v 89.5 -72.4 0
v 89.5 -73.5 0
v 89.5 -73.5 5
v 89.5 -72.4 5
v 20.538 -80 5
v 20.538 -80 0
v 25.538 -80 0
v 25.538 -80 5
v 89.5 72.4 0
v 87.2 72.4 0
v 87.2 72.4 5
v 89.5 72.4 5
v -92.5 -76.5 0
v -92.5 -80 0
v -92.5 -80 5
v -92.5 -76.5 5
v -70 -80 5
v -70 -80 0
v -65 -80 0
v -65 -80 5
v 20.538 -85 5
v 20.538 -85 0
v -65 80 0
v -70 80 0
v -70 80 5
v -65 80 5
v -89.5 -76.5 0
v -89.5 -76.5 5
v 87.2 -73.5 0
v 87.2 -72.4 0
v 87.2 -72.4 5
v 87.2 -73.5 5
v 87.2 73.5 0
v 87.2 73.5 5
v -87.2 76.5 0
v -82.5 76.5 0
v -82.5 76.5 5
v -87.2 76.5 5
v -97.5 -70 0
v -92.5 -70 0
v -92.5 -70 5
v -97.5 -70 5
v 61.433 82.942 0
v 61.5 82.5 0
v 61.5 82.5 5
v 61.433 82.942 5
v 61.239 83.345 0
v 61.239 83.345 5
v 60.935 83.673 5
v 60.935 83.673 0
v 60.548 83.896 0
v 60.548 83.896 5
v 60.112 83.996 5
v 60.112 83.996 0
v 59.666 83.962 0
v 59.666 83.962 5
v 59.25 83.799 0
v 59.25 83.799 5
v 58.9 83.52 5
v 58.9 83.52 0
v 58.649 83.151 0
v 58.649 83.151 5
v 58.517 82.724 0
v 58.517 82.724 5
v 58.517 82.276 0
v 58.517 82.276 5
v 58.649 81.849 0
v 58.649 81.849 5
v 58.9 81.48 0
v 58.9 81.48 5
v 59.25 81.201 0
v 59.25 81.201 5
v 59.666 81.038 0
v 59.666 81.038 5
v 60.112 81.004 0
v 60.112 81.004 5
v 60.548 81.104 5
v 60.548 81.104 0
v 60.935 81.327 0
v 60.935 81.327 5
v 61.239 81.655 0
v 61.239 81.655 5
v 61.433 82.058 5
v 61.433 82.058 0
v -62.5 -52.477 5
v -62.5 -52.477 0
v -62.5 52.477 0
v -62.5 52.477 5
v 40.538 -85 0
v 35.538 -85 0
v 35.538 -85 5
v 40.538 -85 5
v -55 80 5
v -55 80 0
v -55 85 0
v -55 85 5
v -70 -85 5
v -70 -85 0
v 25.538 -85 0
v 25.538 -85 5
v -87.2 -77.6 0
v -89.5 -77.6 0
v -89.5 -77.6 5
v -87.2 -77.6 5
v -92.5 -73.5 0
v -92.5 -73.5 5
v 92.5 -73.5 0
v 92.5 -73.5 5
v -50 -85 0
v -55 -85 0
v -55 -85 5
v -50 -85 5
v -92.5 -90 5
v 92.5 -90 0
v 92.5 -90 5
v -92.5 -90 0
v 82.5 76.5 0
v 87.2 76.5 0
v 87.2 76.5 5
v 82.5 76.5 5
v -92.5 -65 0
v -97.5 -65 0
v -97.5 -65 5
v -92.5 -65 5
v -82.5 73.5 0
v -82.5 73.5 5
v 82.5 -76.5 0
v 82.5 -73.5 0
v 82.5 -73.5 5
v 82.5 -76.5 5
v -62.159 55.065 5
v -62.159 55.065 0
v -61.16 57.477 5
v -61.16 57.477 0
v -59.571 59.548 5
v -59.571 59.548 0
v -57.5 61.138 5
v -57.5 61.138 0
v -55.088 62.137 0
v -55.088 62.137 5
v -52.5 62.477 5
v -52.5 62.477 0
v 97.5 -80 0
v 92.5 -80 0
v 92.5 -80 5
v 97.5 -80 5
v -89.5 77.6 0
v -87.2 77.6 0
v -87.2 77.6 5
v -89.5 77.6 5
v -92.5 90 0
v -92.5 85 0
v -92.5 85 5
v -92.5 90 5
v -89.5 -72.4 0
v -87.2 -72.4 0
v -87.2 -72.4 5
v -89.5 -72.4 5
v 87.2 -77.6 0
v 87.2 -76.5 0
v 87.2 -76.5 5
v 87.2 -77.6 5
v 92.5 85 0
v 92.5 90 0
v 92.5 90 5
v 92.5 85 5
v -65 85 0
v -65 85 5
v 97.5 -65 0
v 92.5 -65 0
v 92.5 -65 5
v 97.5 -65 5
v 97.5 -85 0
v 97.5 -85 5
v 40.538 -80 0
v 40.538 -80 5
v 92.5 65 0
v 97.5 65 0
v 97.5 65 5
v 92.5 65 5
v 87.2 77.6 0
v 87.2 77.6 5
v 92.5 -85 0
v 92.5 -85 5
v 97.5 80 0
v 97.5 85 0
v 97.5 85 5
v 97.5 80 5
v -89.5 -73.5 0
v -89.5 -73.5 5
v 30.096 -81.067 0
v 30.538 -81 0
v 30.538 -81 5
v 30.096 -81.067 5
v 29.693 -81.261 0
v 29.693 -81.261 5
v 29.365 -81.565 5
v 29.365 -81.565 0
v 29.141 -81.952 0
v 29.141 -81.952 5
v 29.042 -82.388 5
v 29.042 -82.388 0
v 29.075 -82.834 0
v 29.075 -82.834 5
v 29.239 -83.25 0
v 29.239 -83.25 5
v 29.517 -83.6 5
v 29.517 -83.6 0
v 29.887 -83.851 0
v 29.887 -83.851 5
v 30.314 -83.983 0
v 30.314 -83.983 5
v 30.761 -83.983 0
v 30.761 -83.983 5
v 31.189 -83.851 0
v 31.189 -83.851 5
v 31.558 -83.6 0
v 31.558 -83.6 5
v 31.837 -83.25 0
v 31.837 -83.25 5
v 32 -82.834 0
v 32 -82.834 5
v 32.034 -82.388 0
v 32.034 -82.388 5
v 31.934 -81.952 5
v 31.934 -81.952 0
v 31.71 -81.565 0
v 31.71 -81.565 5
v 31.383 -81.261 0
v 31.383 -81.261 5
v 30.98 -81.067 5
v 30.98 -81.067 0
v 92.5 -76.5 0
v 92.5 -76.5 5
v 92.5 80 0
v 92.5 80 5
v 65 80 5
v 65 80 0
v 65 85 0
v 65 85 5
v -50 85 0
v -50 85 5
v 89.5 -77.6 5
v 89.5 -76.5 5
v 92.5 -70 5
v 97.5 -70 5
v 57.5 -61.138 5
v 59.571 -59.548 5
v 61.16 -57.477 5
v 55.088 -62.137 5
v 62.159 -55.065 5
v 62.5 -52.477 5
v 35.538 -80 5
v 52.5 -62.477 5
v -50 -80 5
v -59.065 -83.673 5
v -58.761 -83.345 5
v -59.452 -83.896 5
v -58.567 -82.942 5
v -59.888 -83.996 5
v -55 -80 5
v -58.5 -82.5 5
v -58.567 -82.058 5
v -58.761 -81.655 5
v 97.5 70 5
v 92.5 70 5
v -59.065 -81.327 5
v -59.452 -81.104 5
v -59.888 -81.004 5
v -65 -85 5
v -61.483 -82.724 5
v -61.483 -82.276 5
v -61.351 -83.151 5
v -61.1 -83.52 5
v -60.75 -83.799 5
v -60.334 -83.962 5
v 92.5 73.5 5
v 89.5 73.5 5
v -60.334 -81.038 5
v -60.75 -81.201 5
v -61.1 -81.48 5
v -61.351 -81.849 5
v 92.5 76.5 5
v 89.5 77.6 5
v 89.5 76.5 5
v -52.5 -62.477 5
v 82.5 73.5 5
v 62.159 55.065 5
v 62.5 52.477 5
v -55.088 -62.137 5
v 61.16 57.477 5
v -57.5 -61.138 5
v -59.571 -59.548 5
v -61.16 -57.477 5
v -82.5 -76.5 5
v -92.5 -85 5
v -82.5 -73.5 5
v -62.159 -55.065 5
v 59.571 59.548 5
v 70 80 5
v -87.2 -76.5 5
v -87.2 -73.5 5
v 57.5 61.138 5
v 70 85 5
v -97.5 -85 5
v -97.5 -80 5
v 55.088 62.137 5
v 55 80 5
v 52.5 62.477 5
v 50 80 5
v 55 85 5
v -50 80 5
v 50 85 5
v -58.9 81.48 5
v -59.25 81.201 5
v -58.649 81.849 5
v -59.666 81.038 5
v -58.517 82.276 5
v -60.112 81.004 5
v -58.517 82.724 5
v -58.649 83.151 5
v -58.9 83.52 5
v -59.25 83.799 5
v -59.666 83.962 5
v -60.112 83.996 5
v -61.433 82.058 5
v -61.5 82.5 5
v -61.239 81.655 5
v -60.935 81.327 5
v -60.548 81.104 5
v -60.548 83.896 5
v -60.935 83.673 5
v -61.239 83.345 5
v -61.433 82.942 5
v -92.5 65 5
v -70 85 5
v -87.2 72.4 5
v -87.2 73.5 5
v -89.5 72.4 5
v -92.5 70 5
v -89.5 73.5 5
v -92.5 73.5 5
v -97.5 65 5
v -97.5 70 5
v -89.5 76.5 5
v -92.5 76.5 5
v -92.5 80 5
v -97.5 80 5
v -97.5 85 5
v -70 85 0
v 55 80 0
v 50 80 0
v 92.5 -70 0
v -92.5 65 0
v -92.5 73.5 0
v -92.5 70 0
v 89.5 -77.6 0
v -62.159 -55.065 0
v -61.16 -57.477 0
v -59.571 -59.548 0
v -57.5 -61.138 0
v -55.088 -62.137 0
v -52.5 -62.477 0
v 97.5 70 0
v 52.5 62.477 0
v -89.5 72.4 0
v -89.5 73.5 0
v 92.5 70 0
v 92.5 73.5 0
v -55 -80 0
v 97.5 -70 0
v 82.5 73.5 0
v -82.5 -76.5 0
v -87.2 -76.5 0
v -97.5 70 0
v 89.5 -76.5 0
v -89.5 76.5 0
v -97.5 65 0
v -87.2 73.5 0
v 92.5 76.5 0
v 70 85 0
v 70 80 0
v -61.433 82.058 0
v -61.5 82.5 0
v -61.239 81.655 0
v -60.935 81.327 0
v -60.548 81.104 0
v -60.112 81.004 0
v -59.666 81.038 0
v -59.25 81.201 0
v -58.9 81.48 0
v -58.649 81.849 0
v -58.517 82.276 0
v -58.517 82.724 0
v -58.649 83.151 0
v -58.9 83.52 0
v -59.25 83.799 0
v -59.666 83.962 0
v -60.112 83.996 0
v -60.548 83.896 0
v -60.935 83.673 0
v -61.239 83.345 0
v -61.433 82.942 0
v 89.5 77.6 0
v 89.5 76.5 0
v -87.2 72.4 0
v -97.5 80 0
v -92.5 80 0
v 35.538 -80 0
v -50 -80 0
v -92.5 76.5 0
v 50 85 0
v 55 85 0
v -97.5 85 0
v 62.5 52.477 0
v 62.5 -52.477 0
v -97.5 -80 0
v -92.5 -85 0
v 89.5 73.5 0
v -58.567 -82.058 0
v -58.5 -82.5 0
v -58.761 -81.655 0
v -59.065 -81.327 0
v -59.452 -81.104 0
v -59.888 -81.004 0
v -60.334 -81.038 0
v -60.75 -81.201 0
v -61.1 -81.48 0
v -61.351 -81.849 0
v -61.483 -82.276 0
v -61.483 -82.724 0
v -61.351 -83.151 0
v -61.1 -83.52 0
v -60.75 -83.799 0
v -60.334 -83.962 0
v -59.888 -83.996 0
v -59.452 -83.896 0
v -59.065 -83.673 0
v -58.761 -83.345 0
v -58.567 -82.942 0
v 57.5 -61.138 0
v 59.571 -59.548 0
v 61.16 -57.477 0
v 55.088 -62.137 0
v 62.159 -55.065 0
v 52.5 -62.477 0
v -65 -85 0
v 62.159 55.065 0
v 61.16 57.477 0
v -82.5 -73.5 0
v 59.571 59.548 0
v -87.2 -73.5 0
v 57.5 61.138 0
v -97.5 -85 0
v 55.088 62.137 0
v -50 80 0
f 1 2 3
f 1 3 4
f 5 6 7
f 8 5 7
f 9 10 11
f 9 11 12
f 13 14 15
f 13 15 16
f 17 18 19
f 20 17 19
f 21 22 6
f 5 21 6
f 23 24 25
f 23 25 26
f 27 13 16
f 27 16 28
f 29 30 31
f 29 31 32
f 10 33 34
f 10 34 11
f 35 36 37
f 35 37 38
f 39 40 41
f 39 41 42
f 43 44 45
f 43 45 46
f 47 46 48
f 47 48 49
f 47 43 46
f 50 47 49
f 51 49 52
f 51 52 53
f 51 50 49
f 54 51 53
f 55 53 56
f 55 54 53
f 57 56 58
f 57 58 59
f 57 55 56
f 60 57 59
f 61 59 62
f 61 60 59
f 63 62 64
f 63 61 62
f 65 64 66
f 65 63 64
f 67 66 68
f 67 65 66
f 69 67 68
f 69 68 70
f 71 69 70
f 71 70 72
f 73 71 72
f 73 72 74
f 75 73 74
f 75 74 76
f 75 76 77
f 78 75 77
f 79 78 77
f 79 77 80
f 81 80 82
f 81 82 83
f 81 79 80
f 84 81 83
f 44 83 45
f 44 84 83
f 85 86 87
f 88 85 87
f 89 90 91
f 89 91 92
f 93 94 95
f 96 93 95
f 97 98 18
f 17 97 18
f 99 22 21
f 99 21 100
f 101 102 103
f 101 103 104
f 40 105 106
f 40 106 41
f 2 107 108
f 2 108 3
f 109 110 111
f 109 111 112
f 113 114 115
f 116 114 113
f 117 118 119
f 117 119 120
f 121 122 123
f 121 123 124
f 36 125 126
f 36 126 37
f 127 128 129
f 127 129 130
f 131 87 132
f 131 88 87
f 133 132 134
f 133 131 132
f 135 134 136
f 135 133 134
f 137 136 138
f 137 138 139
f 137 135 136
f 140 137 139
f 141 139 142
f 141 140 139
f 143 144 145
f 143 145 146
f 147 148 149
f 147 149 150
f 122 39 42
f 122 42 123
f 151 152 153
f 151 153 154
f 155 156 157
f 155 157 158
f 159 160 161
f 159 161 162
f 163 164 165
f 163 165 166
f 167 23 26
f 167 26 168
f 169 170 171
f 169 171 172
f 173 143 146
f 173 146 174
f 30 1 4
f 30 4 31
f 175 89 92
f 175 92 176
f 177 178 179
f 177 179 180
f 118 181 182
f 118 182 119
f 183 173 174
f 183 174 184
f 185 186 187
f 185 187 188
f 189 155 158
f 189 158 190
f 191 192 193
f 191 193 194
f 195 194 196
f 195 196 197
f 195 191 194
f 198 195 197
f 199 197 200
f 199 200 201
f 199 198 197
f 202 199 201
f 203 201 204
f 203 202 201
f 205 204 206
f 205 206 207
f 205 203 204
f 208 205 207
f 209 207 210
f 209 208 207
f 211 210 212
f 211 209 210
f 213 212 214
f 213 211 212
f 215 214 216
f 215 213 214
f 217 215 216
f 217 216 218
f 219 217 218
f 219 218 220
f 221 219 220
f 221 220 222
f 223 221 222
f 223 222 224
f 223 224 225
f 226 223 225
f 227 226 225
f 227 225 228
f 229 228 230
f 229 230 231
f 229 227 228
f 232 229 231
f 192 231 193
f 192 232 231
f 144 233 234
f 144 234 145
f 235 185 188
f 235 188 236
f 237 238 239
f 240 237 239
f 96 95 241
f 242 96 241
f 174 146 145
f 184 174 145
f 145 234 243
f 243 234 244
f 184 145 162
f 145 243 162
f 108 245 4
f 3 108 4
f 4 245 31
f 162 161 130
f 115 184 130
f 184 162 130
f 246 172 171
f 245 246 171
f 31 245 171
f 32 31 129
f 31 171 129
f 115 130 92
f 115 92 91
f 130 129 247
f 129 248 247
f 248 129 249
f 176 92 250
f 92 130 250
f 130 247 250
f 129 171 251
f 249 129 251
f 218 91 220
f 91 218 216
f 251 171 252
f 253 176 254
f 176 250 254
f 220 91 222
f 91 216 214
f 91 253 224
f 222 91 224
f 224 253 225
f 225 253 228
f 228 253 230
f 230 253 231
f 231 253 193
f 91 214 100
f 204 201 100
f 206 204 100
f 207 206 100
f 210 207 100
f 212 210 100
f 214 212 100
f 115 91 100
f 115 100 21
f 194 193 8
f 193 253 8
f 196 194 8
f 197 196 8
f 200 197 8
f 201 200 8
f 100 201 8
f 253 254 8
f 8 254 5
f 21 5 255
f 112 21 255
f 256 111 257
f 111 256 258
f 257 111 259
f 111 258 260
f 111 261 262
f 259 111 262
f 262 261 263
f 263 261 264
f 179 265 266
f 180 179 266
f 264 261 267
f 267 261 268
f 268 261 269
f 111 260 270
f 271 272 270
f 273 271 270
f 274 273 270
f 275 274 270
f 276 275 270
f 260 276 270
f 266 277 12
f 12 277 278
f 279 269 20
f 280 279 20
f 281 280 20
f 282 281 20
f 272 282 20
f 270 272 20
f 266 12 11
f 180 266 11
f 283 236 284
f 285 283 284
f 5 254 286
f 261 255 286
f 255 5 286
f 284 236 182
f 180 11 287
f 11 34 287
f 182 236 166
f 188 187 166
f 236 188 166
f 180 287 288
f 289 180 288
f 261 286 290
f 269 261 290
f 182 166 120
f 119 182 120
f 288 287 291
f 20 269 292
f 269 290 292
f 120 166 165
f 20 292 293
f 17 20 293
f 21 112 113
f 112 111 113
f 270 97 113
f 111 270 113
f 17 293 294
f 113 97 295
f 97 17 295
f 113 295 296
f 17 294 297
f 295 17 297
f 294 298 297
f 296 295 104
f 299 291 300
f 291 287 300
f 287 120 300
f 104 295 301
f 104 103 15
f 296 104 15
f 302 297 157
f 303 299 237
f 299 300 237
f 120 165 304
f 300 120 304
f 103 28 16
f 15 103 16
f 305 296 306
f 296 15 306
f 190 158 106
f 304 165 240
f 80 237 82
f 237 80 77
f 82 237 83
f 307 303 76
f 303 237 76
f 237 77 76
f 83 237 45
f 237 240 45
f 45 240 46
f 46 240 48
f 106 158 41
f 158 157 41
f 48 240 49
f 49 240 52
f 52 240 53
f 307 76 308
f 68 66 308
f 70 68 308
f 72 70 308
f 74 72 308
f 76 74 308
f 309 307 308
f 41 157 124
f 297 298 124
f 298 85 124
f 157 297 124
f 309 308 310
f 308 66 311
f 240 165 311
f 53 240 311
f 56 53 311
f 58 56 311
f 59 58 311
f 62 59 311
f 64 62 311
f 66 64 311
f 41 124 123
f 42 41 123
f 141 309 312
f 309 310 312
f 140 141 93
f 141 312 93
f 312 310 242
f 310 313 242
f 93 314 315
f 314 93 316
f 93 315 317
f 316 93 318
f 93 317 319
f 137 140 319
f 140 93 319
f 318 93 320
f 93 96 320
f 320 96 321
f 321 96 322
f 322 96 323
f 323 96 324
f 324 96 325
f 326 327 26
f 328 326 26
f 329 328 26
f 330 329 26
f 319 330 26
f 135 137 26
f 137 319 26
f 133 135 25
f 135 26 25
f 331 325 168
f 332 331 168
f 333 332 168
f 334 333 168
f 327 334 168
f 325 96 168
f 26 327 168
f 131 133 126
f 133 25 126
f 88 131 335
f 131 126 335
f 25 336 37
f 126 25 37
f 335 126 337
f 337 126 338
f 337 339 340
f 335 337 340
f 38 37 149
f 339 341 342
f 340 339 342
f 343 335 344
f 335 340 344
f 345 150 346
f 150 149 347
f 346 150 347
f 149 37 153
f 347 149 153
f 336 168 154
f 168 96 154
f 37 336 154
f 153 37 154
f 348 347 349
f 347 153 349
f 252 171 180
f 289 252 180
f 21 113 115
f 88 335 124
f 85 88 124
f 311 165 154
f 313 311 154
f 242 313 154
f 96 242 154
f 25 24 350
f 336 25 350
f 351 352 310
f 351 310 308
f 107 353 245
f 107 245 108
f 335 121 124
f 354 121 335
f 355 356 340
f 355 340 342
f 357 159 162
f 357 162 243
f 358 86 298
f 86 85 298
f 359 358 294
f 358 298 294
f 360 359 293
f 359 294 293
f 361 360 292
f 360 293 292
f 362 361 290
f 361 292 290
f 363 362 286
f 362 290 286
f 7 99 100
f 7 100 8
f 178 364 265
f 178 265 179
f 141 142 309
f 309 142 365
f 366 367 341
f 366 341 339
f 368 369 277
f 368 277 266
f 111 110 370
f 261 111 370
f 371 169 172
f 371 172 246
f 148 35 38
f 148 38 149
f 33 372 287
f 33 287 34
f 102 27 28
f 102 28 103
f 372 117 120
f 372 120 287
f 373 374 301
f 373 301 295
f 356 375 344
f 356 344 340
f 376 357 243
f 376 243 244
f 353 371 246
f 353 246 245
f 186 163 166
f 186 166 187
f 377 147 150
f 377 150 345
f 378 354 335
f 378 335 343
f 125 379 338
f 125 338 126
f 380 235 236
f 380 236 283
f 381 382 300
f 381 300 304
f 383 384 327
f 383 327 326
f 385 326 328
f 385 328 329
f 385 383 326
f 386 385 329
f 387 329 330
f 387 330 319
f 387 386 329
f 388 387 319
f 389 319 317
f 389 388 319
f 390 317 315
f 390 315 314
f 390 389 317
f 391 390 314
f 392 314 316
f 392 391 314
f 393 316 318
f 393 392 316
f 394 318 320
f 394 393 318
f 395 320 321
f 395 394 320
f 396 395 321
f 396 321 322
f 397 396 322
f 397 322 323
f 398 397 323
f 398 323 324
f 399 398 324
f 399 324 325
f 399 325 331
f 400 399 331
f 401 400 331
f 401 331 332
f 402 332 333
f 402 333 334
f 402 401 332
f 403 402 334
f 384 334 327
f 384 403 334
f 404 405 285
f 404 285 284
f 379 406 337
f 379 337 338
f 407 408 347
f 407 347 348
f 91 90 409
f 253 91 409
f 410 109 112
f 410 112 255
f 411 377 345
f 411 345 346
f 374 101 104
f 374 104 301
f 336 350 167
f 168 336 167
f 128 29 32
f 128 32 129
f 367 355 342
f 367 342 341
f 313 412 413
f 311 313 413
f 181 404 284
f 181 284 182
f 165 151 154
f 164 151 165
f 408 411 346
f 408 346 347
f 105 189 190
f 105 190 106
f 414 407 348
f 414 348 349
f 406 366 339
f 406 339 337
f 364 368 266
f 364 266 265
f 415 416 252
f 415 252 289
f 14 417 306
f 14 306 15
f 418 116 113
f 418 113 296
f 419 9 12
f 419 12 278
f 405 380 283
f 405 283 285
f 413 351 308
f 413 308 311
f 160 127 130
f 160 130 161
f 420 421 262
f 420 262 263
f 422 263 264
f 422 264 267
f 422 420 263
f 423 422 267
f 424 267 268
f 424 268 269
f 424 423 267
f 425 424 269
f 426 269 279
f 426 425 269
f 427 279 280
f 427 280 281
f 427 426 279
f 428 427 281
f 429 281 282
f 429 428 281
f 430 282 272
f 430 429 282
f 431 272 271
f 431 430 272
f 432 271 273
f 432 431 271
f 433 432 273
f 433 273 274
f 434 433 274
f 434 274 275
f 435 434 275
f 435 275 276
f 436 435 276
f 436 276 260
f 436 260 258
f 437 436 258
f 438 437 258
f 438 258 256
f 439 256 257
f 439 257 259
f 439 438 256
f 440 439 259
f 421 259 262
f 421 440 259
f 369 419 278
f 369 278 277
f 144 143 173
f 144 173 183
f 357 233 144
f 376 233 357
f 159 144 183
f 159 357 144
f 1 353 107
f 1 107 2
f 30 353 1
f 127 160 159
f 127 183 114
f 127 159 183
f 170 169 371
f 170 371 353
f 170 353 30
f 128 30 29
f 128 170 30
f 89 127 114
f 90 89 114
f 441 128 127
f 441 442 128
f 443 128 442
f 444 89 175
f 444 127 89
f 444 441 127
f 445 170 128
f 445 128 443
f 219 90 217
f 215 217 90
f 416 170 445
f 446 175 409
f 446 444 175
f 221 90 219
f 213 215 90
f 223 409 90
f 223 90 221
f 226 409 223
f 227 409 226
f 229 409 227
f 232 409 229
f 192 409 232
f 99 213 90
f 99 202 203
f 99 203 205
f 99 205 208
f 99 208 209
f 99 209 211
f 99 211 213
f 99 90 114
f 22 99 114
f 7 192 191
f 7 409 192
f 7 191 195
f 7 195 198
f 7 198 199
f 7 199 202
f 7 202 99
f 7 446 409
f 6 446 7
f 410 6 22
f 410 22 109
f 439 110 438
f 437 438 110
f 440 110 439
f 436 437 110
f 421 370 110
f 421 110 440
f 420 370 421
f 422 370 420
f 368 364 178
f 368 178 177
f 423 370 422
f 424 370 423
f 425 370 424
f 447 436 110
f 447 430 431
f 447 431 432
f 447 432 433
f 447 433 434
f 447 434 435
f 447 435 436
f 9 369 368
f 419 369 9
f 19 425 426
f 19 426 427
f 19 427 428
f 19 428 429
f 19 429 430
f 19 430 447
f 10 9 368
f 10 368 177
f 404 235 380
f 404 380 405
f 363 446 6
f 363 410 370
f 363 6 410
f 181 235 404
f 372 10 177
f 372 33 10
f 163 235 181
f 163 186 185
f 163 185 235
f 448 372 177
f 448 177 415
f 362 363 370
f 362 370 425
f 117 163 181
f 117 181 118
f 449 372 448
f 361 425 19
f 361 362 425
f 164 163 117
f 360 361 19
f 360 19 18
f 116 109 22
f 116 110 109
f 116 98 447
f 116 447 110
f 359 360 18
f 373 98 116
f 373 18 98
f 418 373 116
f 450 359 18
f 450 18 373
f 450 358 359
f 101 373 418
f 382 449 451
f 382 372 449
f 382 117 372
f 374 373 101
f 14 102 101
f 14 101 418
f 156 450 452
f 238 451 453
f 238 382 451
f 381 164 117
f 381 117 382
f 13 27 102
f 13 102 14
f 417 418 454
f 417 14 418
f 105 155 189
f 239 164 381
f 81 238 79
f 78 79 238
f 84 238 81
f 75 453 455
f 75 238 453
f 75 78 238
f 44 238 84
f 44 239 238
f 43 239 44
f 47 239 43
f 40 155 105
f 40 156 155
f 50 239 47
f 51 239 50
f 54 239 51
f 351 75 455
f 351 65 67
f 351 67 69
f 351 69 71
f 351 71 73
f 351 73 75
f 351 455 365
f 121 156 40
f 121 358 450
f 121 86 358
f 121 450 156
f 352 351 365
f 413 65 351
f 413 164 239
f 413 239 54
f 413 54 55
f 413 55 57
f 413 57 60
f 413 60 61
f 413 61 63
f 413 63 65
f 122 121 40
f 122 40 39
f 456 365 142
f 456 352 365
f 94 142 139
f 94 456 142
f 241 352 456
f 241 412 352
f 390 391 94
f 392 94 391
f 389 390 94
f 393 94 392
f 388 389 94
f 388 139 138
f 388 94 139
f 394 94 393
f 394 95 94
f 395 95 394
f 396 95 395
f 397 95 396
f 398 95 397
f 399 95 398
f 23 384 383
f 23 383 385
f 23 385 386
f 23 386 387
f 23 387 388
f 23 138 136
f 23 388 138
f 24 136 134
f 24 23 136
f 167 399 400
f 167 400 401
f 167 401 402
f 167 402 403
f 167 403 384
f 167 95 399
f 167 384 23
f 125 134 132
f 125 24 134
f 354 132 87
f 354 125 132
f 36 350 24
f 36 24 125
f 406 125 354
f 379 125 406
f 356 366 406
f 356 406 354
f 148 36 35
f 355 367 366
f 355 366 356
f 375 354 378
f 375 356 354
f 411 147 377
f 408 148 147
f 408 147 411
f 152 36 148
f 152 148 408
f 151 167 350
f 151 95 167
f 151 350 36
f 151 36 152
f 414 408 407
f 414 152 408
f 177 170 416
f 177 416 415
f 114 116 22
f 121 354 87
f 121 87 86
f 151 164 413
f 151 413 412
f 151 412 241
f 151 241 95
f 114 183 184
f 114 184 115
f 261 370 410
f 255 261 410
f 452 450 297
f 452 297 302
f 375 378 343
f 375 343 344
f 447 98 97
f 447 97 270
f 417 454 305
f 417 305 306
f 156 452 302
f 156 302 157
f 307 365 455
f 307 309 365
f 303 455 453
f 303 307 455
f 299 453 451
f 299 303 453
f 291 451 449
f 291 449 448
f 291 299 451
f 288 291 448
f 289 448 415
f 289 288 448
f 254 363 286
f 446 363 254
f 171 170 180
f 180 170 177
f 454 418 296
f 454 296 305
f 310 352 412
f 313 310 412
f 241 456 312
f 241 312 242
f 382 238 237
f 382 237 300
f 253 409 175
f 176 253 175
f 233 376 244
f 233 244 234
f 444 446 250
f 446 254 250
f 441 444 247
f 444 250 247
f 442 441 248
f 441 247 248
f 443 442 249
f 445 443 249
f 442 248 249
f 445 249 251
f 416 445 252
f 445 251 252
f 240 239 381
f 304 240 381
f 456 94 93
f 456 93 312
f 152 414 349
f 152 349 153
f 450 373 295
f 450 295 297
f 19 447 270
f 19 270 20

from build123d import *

# Parameters (mm, degrees)
SKETCH1_R           = 1.5
SKETCH1_W           = 125
SKETCH1_H           = 124.954514062
SKETCH1_W_2         = 5
SKETCH1_H_2         = 5
BOSS_EXTRUDE1_DEPTH = 5
FILLET1_R           = 10


with BuildPart() as part:
    # Sketch1 → Boss-Extrude1 (new body)
    with BuildSketch(Plane.XY):
        Polygon((92.5, 62.5), (92.5, -62.5), (92.5, -65), (97.5, -65), (97.5, -70), (92.5, -70), (92.5, -73.5), (89.5, -73.5), (89.5, -72.4), (87.2, -72.4), (87.2, -73.5), (82.5, -73.5), (82.5, -76.5), (87.2, -76.5), (87.2, -77.6), (89.5, -77.6), (89.5, -76.5), (92.5, -76.5), (92.5, -80), (97.5, -80), (97.5, -85), (92.5, -85), (92.5, -90), (-92.5, -90), (-92.5, -85), (-97.5, -85), (-97.5, -80), (-92.5, -80), (-92.5, -76.5), (-89.5, -76.5), (-89.5, -77.6), (-87.2, -77.6), (-87.2, -76.5), (-82.5, -76.5), (-82.5, -73.5), (-87.2, -73.5), (-87.2, -72.4), (-89.5, -72.4), (-89.5, -73.5), (-92.5, -73.5), (-92.5, -70), (-97.5, -70), (-97.5, -65), (-92.5, -65), (-92.5, 65), (-97.5, 65), (-97.5, 70), (-92.5, 70), (-92.5, 73.5), (-89.5, 73.5), (-89.5, 72.4), (-87.2, 72.4), (-87.2, 73.5), (-82.5, 73.5), (-82.5, 76.5), (-87.2, 76.5), (-87.2, 77.6), (-89.5, 77.6), (-89.5, 76.5), (-92.5, 76.5), (-92.5, 80), (-97.5, 80), (-97.5, 85), (-92.5, 85), (-92.5, 90), (92.5, 90), (92.5, 85), (97.5, 85), (97.5, 80), (92.5, 80), (92.5, 76.5), (89.5, 76.5), (89.5, 77.6), (87.2, 77.6), (87.2, 76.5), (82.5, 76.5), (82.5, 73.5), (87.2, 73.5), (87.2, 72.4), (89.5, 72.4), (89.5, 73.5), (92.5, 73.5), (92.5, 70), (97.5, 70), (97.5, 65), (92.5, 65), align=None)
        with Locations((60, 82.5)):
            Circle(SKETCH1_R, mode=Mode.SUBTRACT)
        with Locations((-60, -82.5)):
            Circle(SKETCH1_R, mode=Mode.SUBTRACT)
        with Locations(Location((-60, 82.5, 0), (0, 0, 180))):
            Circle(SKETCH1_R, mode=Mode.SUBTRACT)
        with Locations(Location((30.537723616, -82.5, 0), (0, 0, 90))):
            Circle(SKETCH1_R, mode=Mode.SUBTRACT)
        Rectangle(SKETCH1_W, SKETCH1_H, mode=Mode.SUBTRACT)
        with Locations((52.5, 82.5)):
            Rectangle(SKETCH1_W_2, SKETCH1_H_2, mode=Mode.SUBTRACT)
        with Locations((67.5, 82.5)):
            Rectangle(SKETCH1_W_2, SKETCH1_H_2, mode=Mode.SUBTRACT)
        with Locations((-52.5, -82.5)):
            Rectangle(SKETCH1_W_2, SKETCH1_H_2, mode=Mode.SUBTRACT)
        with Locations((-67.5, -82.5)):
            Rectangle(SKETCH1_W_2, SKETCH1_H_2, mode=Mode.SUBTRACT)
        with Locations((-52.5, 82.5)):
            Rectangle(SKETCH1_W_2, SKETCH1_H_2, mode=Mode.SUBTRACT)
        with Locations((-67.5, 82.5)):
            Rectangle(SKETCH1_W_2, SKETCH1_H_2, mode=Mode.SUBTRACT)
        with Locations((23.037723616, -82.5)):
            Rectangle(SKETCH1_W_2, SKETCH1_H_2, mode=Mode.SUBTRACT)
        with Locations((38.037723616, -82.5)):
            Rectangle(SKETCH1_W_2, SKETCH1_H_2, mode=Mode.SUBTRACT)
    extrude(amount=BOSS_EXTRUDE1_DEPTH)

    # Fillet1
    fillet1_edges = [part.edges().sort_by_distance(p)[0] for p in [
        (62.5, -62.477257031, 2.5),
        (62.5, 62.477257031, 2.5),
        (-62.5, 62.477257031, 2.5),
        (-62.5, -62.477257031, 2.5),
    ]]
    fillet(fillet1_edges, radius=FILLET1_R)


solid = part.part
